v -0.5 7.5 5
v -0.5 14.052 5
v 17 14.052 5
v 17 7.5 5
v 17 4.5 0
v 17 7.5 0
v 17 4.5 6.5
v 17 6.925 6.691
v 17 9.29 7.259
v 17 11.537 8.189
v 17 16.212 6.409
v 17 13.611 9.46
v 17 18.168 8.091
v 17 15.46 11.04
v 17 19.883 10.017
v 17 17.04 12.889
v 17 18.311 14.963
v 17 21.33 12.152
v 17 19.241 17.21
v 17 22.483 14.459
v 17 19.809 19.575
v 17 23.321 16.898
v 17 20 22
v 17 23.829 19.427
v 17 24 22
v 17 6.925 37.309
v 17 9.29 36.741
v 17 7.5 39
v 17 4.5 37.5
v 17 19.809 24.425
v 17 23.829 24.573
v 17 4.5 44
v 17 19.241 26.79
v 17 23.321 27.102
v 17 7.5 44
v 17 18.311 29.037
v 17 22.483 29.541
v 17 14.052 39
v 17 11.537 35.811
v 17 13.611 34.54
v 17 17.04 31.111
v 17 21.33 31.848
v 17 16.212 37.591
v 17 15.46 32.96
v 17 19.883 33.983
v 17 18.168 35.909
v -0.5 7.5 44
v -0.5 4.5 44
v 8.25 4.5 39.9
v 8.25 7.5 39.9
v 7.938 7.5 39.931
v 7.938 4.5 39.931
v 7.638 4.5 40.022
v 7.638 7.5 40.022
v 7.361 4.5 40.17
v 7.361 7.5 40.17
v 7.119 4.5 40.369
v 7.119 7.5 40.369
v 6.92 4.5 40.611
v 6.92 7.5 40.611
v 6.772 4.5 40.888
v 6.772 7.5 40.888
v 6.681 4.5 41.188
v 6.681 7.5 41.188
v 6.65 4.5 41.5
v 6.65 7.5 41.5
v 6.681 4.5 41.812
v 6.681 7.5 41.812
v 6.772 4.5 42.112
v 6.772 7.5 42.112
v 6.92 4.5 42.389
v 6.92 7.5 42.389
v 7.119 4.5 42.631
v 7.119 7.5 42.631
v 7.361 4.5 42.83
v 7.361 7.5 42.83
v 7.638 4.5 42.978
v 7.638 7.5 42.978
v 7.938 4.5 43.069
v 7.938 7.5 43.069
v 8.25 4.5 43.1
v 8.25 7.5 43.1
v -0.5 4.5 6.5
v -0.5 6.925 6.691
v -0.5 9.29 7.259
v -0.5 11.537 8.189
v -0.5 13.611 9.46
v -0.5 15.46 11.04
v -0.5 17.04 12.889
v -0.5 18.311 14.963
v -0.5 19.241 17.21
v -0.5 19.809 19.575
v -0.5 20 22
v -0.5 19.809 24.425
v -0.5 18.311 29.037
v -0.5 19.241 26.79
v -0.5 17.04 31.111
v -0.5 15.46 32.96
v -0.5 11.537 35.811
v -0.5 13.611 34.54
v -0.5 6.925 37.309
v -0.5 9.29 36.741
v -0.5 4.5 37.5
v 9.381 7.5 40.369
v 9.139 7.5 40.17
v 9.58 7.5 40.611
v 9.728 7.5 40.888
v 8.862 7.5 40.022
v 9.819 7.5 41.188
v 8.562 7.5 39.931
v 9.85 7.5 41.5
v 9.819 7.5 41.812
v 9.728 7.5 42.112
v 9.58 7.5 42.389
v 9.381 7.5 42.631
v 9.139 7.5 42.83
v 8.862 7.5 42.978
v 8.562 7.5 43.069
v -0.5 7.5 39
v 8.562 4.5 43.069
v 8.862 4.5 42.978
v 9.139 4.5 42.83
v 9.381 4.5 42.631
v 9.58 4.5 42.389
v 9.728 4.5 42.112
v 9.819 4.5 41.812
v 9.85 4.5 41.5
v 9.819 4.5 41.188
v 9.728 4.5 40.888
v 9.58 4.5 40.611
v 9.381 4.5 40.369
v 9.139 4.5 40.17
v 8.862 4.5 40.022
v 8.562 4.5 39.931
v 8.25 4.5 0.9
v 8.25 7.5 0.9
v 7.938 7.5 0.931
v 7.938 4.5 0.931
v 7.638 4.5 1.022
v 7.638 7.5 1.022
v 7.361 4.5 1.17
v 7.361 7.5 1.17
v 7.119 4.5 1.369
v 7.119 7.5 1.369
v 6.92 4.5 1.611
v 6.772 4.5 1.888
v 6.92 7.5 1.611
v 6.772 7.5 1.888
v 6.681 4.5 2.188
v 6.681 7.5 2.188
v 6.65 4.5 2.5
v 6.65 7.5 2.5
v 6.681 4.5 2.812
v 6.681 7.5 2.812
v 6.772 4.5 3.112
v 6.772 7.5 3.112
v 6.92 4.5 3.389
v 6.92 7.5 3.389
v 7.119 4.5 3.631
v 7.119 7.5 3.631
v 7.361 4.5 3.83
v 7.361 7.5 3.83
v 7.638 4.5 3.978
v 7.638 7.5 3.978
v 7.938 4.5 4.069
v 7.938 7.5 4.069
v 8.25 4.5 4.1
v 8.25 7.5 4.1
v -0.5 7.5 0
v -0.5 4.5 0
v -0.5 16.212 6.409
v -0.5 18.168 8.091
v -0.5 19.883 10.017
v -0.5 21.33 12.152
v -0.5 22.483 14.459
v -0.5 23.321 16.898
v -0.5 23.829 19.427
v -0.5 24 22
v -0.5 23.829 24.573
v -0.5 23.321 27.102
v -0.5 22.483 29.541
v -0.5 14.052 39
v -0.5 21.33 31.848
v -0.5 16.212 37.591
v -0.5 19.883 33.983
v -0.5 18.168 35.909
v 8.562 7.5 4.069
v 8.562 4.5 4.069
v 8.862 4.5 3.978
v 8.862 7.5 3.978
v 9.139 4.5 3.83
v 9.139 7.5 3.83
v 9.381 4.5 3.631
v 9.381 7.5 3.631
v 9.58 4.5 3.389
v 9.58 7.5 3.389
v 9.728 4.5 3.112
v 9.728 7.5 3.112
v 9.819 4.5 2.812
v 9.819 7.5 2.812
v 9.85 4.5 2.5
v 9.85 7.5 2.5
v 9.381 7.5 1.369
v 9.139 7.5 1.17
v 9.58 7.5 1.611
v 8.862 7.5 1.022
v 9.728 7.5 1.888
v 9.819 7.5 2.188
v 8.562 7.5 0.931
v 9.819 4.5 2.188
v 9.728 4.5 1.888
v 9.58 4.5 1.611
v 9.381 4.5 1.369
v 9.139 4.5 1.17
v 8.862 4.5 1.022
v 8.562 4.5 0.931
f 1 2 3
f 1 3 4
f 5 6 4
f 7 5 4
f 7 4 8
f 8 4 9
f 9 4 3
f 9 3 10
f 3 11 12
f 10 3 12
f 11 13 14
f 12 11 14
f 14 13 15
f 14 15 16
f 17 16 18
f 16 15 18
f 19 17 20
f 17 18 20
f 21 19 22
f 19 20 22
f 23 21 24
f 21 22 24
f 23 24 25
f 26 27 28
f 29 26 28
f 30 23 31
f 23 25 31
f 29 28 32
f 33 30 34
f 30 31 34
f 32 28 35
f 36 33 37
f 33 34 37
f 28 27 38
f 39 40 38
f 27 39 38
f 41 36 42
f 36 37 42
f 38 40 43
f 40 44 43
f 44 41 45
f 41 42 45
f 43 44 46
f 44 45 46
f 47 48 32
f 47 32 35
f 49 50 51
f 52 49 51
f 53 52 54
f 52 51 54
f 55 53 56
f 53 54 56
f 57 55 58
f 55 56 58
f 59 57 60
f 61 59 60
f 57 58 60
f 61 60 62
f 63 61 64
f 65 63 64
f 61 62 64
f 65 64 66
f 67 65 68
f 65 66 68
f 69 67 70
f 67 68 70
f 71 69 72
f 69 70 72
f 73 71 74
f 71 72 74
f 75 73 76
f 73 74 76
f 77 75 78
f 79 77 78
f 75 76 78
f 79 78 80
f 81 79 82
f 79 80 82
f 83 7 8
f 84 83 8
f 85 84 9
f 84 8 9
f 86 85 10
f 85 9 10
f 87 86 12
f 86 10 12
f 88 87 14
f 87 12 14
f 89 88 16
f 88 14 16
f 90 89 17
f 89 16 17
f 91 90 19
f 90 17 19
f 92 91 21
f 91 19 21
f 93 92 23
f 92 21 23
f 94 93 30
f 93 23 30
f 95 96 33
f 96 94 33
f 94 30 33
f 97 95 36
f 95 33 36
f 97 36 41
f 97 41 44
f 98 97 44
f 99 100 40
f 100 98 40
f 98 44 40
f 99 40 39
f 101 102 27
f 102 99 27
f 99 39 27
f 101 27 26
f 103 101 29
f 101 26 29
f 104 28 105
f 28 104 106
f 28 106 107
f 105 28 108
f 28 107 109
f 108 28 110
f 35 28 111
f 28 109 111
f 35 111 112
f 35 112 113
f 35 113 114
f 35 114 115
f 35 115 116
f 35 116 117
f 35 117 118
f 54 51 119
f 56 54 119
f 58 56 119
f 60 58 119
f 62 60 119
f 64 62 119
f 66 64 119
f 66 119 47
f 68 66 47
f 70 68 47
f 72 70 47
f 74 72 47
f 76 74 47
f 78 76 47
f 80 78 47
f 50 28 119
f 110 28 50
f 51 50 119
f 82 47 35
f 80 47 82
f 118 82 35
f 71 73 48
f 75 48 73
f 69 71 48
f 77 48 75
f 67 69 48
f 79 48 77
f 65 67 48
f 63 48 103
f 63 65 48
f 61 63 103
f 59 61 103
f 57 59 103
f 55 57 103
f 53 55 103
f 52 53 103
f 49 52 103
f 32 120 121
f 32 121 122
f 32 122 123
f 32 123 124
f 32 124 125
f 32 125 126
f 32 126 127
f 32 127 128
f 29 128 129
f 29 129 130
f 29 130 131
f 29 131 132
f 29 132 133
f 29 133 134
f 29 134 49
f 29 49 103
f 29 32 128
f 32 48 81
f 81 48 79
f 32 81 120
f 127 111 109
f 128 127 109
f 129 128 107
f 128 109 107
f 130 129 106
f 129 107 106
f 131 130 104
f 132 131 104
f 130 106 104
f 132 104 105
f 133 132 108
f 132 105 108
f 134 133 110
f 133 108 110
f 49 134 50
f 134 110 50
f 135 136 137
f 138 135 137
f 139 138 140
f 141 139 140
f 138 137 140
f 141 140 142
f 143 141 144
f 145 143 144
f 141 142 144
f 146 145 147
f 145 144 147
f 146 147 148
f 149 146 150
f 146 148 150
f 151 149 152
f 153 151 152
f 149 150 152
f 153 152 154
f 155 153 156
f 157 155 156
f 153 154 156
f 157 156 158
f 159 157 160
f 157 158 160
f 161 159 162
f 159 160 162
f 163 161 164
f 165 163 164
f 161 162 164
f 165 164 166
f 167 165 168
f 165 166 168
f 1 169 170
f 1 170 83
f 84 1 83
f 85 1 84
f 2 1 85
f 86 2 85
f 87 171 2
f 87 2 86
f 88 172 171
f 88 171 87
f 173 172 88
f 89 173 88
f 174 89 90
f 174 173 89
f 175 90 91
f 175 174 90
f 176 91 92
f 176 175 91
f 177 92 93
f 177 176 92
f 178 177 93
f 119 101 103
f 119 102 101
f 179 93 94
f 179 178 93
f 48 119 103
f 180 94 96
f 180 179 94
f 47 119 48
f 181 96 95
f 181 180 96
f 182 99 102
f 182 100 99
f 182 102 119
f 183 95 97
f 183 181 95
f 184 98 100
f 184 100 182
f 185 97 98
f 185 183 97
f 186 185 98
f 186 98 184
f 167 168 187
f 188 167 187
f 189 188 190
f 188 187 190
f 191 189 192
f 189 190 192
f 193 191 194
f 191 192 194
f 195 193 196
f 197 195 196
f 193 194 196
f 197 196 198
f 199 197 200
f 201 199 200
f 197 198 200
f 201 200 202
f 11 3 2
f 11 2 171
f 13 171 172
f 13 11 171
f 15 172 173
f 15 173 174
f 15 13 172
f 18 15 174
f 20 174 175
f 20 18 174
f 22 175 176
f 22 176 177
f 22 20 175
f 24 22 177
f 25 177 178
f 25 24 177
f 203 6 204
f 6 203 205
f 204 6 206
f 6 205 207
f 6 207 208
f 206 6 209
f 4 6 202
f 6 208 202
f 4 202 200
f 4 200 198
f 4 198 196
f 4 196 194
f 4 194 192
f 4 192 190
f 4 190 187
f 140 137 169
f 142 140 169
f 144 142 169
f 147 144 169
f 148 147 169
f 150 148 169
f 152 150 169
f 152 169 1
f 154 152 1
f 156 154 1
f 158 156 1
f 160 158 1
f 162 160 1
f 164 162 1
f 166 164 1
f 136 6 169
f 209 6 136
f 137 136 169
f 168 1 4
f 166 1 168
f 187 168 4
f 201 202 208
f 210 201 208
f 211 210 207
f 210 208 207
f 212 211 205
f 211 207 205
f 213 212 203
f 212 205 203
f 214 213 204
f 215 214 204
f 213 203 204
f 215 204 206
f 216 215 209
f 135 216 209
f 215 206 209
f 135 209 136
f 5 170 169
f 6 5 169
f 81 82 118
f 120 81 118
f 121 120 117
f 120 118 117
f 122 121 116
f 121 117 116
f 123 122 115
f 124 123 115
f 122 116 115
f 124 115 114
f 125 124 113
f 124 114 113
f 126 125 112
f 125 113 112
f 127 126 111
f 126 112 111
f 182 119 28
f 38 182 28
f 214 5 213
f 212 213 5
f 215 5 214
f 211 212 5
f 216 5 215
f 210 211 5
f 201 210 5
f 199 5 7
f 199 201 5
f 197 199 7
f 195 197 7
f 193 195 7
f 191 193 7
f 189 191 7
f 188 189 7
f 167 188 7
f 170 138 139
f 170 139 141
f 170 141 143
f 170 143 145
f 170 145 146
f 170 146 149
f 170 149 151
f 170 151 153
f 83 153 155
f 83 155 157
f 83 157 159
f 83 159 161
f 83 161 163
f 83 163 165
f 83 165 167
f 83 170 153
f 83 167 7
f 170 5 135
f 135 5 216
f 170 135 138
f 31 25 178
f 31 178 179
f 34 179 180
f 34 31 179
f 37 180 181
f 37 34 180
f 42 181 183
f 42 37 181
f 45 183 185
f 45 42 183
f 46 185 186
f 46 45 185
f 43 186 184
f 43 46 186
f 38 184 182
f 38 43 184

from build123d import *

# Parameters (mm, degrees)
SKETCH_1_W               = 17
SKETCH_1_H               = 40
EXTRUDE_1_DEPTH          = 50
SKETCH_2_W               = 17
SKETCH_2_H               = 1
CUT_EXTRUDE_1_DEPTH      = 67.2495283
SKETCH_4_W               = 0.5
SKETCH_4_H               = 39
EXTRUDE_2_DEPTH          = 50
SKETCH_5_R               = 15.5
CUT_EXTRUDE_2_DEPTH      = 17.5
CUT_EXTRUDE_3_DEPTH      = 17.5
CUT_EXTRUDE_4_DEPTH      = 3
CUT_EXTRUDE_START        = -64
CUT_EXTRUDE_7_DEPTH      = 64
SKETCH_9_W               = 5
SKETCH_9_H               = 3
EXTRUDE_3_DEPTH          = 17.5
CUT_EXTRUDE_8_DEPTH      = 54.087192429
CUT_EXTRUDE_8_DEPTH_BACK = 54.087192429
CUT_EXTRUDE_9_DEPTH      = 64


with BuildPart() as part:
    # 草图1 → 凸台-拉伸1 (new body)
    with BuildSketch(Plane(origin=(0, 0, 0), x_dir=(1, 0, 0), z_dir=(0, 1, 0))):
        with Locations((8.5, -20)):
            Rectangle(SKETCH_1_W, SKETCH_1_H)
    extrude(amount=EXTRUDE_1_DEPTH)

    # 草图2 → 切除-拉伸1 (cut, through all)
    with BuildSketch(Plane.XZ):
        with Locations((8.5, 39.5)):
            Rectangle(SKETCH_2_W, SKETCH_2_H)
    extrude(amount=-CUT_EXTRUDE_1_DEPTH, mode=Mode.SUBTRACT)

    # 草图4 → 凸台-拉伸2 (add)
    with BuildSketch(Plane.XZ):
        with Locations((-0.25, 19.5)):
            Rectangle(SKETCH_4_W, SKETCH_4_H)
    extrude(amount=-EXTRUDE_2_DEPTH)

    # 草图5 → 切除-拉伸2 (cut)
    with BuildSketch(Plane(origin=(17, 0, 0), x_dir=(0, 0, -1), z_dir=(1, 0, 0))):
        with Locations((-22, 4.5)):
            Circle(SKETCH_5_R)
    extrude(amount=-CUT_EXTRUDE_2_DEPTH, mode=Mode.SUBTRACT)

    # 草图6 → 切除-拉伸3 (cut)
    with BuildSketch(Plane(origin=(17, 0, 0), x_dir=(0, 0, -1), z_dir=(1, 0, 0))):
        Polygon((0, 3), (0, 24), (0, 50), (-39, 50), (-39, 24), (-22, 24), (-5, 24), (-5, 3), align=None)
    extrude(amount=-CUT_EXTRUDE_3_DEPTH, mode=Mode.SUBTRACT)

    # 草图7 → 切除-拉伸4 (cut)
    with BuildSketch(Plane(origin=(0, 3, 0), x_dir=(1, 0, 0), z_dir=(0, 1, 0))):
        with BuildLine():
            ThreePointArc((8.25, -0.9), (6.65, -2.5), (8.25, -4.1))
            Line((8.25, -4.1), (8.25, -0.9))
        make_face()
        with BuildLine():
            Line((8.25, -0.9), (8.25, -4.1))
            ThreePointArc((8.25, -4.1), (9.38137085, -3.63137085), (9.85, -2.5))
            ThreePointArc((9.85, -2.5), (9.38137085, -1.36862915), (8.25, -0.9))
        make_face()
    extrude(amount=-CUT_EXTRUDE_4_DEPTH, mode=Mode.SUBTRACT)

    # 草图8 → 切除-拉伸7 (cut)
    with BuildSketch(Plane.ZY.offset(0.5).offset(CUT_EXTRUDE_START)):
        with BuildLine():
            Line((5, 3), (5, 4.5))
            Line((5, 4.5), (-8.613521725, 4.5))
            Line((-8.613521725, 4.5), (17.256515703, -28.446816898))
            Line((17.256515703, -28.446816898), (39, 0))
            Line((39, 0), (36.832396974, 0))
            ThreePointArc((36.832396974, 0), (22, -11), (7.167603026, 0))
            Line((7.167603026, 0), (0, 0))
            Line((0, 0), (0, 3))
            Line((0, 3), (5, 3))
        make_face()
        with BuildLine():
            ThreePointArc((7.167603026, 0), (6.667809141, 2.225373998), (6.5, 4.5))
            Line((6.5, 4.5), (5, 4.5))
            Line((5, 4.5), (5, 3))
            Line((5, 3), (0, 3))
            Line((0, 3), (0, 0))
            Line((0, 0), (7.167603026, 0))
        make_face()
        with BuildLine():
            Line((37.5, 4.5), (22, 4.5))
            Line((22, 4.5), (6.5, 4.5))
            ThreePointArc((6.5, 4.5), (6.667809141, 2.225373998), (7.167603026, 0))
            ThreePointArc((7.167603026, 0), (22, -11), (36.832396974, 0))
            ThreePointArc((36.832396974, 0), (37.332190859, 2.225373998), (37.5, 4.5))
        make_face()
        with BuildLine():
            Line((6.5, 4.5), (22, 4.5))
            Line((22, 4.5), (37.5, 4.5))
            ThreePointArc((37.5, 4.5), (22, 20), (6.5, 4.5))
        make_face()
        with BuildLine():
            Line((39, 4.5), (37.5, 4.5))
            ThreePointArc((37.5, 4.5), (37.332190859, 2.225373998), (36.832396974, 0))
            Line((36.832396974, 0), (39, 0))
            Line((39, 0), (39, 4.5))
        make_face()
    extrude(amount=CUT_EXTRUDE_7_DEPTH, mode=Mode.SUBTRACT)

    # 草图9 → 凸台-拉伸3 (add)
    with BuildSketch(Plane.ZY.offset(0.5)):
        with Locations((2.5, 6)):
            Rectangle(SKETCH_9_W, SKETCH_9_H)
        with Locations((41.5, 6)):
            Rectangle(SKETCH_9_W, SKETCH_9_H)
    extrude(amount=-EXTRUDE_3_DEPTH)

    # 草图10 → 切除-拉伸8 (cut, two sides: drawn at the far end of the back side and taken through both)
    with BuildSketch(Plane.ZY.offset(0.5).offset(-CUT_EXTRUDE_8_DEPTH_BACK)):
        with BuildLine():
            Line((5, 24), (5, 14.052486587))
            ThreePointArc((5, 14.052486587), (12.151738439, 21.330381583), (22, 24))
            Line((22, 24), (5, 24))
        make_face()
        with BuildLine():
            Line((39, 24), (22, 24))
            ThreePointArc((22, 24), (31.848261561, 21.330381583), (39, 14.052486587))
            Line((39, 14.052486587), (39, 24))
        make_face()
    extrude(amount=CUT_EXTRUDE_8_DEPTH + CUT_EXTRUDE_8_DEPTH_BACK, mode=Mode.SUBTRACT)

    # 草图11 → 切除-拉伸9 (cut)
    with BuildSketch(Plane(origin=(0, 7.5, 0), x_dir=(1, 0, 0), z_dir=(0, 1, 0))):
        with BuildLine():
            ThreePointArc((8.25, -0.9), (6.65, -2.5), (8.25, -4.1))
            Line((8.25, -4.1), (8.25, -0.9))
        make_face()
        with BuildLine():
            Line((8.25, -0.9), (8.25, -4.1))
            ThreePointArc((8.25, -4.1), (9.38137085, -3.63137085), (9.85, -2.5))
            ThreePointArc((9.85, -2.5), (9.38137085, -1.36862915), (8.25, -0.9))
        make_face()
        with BuildLine():
            ThreePointArc((9.85, -41.5), (9.38137085, -40.36862915), (8.25, -39.9))
            Line((8.25, -39.9), (8.25, -43.1))
            ThreePointArc((8.25, -43.1), (9.38137085, -42.63137085), (9.85, -41.5))
        make_face()
        with BuildLine():
            Line((8.25, -43.1), (8.25, -39.9))
            ThreePointArc((8.25, -39.9), (6.65, -41.5), (8.25, -43.1))
        make_face()
    extrude(amount=-CUT_EXTRUDE_9_DEPTH, mode=Mode.SUBTRACT)


solid = part.part
